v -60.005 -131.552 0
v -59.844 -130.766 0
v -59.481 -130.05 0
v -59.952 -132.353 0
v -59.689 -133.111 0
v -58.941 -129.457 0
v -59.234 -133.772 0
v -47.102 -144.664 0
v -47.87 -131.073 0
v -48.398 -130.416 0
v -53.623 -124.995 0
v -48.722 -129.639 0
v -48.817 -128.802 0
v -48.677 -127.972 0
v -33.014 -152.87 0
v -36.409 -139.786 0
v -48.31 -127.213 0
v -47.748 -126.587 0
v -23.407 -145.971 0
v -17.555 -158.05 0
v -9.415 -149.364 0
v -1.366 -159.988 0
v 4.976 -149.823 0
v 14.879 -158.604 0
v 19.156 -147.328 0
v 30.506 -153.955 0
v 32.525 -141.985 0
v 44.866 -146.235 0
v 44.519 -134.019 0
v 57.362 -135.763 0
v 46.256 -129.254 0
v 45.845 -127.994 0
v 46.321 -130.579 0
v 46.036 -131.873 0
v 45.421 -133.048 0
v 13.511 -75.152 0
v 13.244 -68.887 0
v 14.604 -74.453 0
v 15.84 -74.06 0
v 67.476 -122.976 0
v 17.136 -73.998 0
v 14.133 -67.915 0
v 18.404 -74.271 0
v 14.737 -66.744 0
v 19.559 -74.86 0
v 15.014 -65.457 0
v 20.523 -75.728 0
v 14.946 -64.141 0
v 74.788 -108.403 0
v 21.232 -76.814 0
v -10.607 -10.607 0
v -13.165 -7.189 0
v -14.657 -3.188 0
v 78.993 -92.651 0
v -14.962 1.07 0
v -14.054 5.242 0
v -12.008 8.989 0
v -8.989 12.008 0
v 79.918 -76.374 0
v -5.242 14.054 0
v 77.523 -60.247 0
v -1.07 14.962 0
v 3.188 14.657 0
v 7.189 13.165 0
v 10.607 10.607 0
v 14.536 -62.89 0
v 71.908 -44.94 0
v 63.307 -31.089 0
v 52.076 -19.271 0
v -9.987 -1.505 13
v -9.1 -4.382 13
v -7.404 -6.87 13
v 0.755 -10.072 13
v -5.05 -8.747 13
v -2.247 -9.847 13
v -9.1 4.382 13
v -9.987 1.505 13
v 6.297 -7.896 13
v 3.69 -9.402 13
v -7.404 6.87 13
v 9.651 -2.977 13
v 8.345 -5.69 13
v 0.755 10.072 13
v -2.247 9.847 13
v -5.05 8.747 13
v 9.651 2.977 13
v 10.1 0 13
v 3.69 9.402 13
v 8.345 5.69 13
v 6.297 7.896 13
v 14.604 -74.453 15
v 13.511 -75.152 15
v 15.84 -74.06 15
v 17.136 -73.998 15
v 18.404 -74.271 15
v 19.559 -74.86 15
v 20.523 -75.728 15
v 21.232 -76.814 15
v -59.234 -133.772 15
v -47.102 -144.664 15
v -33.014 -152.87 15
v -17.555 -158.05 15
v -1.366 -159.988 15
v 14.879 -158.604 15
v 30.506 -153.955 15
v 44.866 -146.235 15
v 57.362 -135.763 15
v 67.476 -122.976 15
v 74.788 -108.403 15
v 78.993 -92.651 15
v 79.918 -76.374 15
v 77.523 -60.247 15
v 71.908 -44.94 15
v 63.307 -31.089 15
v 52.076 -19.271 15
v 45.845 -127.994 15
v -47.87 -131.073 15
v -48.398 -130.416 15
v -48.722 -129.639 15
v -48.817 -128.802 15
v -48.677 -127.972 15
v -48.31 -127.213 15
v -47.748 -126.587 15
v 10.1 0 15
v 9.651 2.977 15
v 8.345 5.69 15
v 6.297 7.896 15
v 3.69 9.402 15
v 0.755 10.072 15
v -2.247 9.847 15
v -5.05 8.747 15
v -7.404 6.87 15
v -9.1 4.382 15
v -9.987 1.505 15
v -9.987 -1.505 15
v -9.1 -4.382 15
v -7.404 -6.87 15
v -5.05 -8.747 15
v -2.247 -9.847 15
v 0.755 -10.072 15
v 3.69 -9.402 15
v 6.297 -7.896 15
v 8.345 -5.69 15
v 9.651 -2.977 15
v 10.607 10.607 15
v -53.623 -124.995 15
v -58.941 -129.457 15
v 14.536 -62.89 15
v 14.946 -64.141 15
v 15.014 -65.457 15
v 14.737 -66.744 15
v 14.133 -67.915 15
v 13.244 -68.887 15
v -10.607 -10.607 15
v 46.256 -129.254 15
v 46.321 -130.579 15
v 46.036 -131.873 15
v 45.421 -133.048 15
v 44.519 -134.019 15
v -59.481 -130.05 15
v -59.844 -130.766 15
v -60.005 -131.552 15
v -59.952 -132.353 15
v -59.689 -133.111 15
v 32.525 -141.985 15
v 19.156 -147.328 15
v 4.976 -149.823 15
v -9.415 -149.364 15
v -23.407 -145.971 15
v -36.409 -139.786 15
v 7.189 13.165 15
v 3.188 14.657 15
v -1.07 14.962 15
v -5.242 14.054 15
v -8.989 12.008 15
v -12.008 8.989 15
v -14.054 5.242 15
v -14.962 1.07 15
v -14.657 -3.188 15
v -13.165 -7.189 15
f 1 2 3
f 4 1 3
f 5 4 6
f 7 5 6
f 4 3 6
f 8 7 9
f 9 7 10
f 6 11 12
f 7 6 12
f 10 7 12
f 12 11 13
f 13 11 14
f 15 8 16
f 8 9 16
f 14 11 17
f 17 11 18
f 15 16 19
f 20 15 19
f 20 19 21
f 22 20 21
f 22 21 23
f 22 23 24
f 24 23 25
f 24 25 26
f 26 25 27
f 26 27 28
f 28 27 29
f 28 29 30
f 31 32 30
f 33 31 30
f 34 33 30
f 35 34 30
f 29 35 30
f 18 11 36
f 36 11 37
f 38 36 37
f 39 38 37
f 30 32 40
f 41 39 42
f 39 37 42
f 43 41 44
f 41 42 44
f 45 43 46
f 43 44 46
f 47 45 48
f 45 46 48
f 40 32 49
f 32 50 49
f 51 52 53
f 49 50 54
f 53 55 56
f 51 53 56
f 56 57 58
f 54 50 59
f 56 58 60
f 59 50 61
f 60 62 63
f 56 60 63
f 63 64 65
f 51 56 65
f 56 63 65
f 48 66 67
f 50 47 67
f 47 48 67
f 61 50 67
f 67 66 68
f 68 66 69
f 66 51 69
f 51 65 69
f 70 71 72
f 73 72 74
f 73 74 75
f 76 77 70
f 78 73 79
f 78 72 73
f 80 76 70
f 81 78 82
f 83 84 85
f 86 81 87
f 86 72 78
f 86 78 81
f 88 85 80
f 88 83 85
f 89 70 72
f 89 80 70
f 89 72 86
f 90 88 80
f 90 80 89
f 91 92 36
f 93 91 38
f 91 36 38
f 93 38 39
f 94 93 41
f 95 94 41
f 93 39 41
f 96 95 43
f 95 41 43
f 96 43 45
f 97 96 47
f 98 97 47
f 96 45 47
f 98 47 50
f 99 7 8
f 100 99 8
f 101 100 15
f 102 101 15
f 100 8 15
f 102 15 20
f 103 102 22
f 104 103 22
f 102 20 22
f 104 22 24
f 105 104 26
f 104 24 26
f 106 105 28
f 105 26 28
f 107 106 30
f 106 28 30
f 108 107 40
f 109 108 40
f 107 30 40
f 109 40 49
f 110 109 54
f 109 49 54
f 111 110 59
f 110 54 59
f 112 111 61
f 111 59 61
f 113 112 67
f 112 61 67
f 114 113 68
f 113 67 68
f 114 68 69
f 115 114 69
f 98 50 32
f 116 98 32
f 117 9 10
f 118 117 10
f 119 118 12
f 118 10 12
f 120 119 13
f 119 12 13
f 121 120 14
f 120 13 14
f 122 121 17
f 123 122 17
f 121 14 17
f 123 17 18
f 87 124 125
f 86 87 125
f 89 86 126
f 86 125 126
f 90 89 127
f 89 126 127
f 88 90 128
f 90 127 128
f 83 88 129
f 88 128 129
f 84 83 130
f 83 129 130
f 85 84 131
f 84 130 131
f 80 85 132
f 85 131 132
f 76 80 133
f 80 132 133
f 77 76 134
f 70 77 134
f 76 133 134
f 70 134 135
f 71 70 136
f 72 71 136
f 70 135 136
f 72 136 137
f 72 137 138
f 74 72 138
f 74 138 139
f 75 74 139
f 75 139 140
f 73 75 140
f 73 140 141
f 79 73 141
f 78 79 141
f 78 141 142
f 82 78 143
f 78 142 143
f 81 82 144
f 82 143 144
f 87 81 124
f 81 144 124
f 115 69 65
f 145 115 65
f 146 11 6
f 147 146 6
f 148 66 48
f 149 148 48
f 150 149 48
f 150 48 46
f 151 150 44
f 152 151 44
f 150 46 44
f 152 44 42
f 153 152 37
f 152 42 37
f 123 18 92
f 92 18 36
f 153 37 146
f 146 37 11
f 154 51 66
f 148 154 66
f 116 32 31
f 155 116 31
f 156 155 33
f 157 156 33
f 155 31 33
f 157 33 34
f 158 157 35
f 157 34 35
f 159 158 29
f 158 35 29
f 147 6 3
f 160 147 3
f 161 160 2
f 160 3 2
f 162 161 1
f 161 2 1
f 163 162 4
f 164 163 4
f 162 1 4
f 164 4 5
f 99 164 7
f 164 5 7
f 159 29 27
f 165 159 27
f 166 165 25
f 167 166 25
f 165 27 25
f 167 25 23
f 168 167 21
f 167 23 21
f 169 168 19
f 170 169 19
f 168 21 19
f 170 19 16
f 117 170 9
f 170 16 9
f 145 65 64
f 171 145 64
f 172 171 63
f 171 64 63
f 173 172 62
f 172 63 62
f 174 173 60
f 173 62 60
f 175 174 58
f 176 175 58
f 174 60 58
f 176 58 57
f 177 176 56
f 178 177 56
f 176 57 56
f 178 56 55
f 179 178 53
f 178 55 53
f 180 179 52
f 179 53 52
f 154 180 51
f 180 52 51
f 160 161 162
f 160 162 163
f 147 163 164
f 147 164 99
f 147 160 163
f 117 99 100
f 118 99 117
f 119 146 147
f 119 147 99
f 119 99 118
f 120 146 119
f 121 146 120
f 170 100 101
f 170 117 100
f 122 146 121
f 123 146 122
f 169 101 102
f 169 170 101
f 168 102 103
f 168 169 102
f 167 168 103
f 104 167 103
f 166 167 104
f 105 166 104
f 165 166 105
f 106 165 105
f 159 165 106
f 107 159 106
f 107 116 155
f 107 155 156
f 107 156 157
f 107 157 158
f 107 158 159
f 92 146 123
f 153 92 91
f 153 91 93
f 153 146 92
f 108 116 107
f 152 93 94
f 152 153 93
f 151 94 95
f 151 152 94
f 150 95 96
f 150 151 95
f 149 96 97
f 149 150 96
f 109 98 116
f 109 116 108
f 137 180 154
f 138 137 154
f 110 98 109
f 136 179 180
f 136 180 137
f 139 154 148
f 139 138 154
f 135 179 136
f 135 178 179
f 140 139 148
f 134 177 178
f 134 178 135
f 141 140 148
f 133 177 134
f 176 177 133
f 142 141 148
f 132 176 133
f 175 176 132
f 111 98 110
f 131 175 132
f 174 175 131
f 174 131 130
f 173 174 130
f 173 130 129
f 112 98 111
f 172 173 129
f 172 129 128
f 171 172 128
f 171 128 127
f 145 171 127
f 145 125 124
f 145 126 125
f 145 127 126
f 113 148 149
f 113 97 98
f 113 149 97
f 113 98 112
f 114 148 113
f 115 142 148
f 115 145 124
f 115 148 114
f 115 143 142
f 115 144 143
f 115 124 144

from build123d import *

# Parameters (mm, degrees)
EXTRUDE_1_DEPTH     = 15
SKETCH_5_R          = 10.1
CUT_EXTRUDE_2_DEPTH = 2


with BuildPart() as part:
    # ｽｹｯﾁ4 → ﾎﾞｽ - 押し出し1 (new body)
    with BuildSketch(Plane.XY):
        with BuildLine():
            Line((-53.623111018, -124.995132678), (-58.940636287, -129.45706617))
            ThreePointArc((-58.940636287, -129.45706617), (-60.005384698, -131.552012131), (-59.233530865, -133.771635843))
            ThreePointArc((-59.233530865, -133.771635843), (57.362306223, -135.763481103), (52.076178918, -19.270504783))
            Line((52.076178918, -19.270504783), (10.606601718, 10.606601718))
            ThreePointArc((10.606601718, 10.606601718), (-10.606601718, 10.606601718), (-10.606601718, -10.606601718))
            Line((-10.606601718, -10.606601718), (14.536280154, -62.889638219))
            ThreePointArc((14.536280154, -62.889638219), (14.918089499, -66.109676181), (13.244185189, -68.886809092))
            Line((13.244185189, -68.886809092), (-53.623111018, -124.995132678))
        make_face()
        with BuildLine():
            Line((21.232400696, -76.813798404), (45.844843506, -127.993820346))
            ThreePointArc((45.844843506, -127.993820346), (46.221944165, -131.235480845), (44.518718993, -134.019289696))
            ThreePointArc((44.518718993, -134.019289696), (-2.231208213, -149.964431749), (-47.870174388, -131.072951785))
            ThreePointArc((-47.870174388, -131.072951785), (-48.817477846, -128.802229421), (-47.747678417, -126.586582094))
            Line((-47.747678417, -126.586582094), (13.511229465, -75.151532228))
            ThreePointArc((13.511229465, -75.151532228), (17.77869109, -74.092739753), (21.232400696, -76.813798404))
        make_face(mode=Mode.SUBTRACT)
    extrude(amount=EXTRUDE_1_DEPTH)

    # ｽｹｯﾁ5 → ｶｯﾄ - 押し出し2 (cut)
    with BuildSketch(Plane.XY.offset(15)):
        Circle(SKETCH_5_R)
    extrude(amount=-CUT_EXTRUDE_2_DEPTH, mode=Mode.SUBTRACT)


solid = part.part
